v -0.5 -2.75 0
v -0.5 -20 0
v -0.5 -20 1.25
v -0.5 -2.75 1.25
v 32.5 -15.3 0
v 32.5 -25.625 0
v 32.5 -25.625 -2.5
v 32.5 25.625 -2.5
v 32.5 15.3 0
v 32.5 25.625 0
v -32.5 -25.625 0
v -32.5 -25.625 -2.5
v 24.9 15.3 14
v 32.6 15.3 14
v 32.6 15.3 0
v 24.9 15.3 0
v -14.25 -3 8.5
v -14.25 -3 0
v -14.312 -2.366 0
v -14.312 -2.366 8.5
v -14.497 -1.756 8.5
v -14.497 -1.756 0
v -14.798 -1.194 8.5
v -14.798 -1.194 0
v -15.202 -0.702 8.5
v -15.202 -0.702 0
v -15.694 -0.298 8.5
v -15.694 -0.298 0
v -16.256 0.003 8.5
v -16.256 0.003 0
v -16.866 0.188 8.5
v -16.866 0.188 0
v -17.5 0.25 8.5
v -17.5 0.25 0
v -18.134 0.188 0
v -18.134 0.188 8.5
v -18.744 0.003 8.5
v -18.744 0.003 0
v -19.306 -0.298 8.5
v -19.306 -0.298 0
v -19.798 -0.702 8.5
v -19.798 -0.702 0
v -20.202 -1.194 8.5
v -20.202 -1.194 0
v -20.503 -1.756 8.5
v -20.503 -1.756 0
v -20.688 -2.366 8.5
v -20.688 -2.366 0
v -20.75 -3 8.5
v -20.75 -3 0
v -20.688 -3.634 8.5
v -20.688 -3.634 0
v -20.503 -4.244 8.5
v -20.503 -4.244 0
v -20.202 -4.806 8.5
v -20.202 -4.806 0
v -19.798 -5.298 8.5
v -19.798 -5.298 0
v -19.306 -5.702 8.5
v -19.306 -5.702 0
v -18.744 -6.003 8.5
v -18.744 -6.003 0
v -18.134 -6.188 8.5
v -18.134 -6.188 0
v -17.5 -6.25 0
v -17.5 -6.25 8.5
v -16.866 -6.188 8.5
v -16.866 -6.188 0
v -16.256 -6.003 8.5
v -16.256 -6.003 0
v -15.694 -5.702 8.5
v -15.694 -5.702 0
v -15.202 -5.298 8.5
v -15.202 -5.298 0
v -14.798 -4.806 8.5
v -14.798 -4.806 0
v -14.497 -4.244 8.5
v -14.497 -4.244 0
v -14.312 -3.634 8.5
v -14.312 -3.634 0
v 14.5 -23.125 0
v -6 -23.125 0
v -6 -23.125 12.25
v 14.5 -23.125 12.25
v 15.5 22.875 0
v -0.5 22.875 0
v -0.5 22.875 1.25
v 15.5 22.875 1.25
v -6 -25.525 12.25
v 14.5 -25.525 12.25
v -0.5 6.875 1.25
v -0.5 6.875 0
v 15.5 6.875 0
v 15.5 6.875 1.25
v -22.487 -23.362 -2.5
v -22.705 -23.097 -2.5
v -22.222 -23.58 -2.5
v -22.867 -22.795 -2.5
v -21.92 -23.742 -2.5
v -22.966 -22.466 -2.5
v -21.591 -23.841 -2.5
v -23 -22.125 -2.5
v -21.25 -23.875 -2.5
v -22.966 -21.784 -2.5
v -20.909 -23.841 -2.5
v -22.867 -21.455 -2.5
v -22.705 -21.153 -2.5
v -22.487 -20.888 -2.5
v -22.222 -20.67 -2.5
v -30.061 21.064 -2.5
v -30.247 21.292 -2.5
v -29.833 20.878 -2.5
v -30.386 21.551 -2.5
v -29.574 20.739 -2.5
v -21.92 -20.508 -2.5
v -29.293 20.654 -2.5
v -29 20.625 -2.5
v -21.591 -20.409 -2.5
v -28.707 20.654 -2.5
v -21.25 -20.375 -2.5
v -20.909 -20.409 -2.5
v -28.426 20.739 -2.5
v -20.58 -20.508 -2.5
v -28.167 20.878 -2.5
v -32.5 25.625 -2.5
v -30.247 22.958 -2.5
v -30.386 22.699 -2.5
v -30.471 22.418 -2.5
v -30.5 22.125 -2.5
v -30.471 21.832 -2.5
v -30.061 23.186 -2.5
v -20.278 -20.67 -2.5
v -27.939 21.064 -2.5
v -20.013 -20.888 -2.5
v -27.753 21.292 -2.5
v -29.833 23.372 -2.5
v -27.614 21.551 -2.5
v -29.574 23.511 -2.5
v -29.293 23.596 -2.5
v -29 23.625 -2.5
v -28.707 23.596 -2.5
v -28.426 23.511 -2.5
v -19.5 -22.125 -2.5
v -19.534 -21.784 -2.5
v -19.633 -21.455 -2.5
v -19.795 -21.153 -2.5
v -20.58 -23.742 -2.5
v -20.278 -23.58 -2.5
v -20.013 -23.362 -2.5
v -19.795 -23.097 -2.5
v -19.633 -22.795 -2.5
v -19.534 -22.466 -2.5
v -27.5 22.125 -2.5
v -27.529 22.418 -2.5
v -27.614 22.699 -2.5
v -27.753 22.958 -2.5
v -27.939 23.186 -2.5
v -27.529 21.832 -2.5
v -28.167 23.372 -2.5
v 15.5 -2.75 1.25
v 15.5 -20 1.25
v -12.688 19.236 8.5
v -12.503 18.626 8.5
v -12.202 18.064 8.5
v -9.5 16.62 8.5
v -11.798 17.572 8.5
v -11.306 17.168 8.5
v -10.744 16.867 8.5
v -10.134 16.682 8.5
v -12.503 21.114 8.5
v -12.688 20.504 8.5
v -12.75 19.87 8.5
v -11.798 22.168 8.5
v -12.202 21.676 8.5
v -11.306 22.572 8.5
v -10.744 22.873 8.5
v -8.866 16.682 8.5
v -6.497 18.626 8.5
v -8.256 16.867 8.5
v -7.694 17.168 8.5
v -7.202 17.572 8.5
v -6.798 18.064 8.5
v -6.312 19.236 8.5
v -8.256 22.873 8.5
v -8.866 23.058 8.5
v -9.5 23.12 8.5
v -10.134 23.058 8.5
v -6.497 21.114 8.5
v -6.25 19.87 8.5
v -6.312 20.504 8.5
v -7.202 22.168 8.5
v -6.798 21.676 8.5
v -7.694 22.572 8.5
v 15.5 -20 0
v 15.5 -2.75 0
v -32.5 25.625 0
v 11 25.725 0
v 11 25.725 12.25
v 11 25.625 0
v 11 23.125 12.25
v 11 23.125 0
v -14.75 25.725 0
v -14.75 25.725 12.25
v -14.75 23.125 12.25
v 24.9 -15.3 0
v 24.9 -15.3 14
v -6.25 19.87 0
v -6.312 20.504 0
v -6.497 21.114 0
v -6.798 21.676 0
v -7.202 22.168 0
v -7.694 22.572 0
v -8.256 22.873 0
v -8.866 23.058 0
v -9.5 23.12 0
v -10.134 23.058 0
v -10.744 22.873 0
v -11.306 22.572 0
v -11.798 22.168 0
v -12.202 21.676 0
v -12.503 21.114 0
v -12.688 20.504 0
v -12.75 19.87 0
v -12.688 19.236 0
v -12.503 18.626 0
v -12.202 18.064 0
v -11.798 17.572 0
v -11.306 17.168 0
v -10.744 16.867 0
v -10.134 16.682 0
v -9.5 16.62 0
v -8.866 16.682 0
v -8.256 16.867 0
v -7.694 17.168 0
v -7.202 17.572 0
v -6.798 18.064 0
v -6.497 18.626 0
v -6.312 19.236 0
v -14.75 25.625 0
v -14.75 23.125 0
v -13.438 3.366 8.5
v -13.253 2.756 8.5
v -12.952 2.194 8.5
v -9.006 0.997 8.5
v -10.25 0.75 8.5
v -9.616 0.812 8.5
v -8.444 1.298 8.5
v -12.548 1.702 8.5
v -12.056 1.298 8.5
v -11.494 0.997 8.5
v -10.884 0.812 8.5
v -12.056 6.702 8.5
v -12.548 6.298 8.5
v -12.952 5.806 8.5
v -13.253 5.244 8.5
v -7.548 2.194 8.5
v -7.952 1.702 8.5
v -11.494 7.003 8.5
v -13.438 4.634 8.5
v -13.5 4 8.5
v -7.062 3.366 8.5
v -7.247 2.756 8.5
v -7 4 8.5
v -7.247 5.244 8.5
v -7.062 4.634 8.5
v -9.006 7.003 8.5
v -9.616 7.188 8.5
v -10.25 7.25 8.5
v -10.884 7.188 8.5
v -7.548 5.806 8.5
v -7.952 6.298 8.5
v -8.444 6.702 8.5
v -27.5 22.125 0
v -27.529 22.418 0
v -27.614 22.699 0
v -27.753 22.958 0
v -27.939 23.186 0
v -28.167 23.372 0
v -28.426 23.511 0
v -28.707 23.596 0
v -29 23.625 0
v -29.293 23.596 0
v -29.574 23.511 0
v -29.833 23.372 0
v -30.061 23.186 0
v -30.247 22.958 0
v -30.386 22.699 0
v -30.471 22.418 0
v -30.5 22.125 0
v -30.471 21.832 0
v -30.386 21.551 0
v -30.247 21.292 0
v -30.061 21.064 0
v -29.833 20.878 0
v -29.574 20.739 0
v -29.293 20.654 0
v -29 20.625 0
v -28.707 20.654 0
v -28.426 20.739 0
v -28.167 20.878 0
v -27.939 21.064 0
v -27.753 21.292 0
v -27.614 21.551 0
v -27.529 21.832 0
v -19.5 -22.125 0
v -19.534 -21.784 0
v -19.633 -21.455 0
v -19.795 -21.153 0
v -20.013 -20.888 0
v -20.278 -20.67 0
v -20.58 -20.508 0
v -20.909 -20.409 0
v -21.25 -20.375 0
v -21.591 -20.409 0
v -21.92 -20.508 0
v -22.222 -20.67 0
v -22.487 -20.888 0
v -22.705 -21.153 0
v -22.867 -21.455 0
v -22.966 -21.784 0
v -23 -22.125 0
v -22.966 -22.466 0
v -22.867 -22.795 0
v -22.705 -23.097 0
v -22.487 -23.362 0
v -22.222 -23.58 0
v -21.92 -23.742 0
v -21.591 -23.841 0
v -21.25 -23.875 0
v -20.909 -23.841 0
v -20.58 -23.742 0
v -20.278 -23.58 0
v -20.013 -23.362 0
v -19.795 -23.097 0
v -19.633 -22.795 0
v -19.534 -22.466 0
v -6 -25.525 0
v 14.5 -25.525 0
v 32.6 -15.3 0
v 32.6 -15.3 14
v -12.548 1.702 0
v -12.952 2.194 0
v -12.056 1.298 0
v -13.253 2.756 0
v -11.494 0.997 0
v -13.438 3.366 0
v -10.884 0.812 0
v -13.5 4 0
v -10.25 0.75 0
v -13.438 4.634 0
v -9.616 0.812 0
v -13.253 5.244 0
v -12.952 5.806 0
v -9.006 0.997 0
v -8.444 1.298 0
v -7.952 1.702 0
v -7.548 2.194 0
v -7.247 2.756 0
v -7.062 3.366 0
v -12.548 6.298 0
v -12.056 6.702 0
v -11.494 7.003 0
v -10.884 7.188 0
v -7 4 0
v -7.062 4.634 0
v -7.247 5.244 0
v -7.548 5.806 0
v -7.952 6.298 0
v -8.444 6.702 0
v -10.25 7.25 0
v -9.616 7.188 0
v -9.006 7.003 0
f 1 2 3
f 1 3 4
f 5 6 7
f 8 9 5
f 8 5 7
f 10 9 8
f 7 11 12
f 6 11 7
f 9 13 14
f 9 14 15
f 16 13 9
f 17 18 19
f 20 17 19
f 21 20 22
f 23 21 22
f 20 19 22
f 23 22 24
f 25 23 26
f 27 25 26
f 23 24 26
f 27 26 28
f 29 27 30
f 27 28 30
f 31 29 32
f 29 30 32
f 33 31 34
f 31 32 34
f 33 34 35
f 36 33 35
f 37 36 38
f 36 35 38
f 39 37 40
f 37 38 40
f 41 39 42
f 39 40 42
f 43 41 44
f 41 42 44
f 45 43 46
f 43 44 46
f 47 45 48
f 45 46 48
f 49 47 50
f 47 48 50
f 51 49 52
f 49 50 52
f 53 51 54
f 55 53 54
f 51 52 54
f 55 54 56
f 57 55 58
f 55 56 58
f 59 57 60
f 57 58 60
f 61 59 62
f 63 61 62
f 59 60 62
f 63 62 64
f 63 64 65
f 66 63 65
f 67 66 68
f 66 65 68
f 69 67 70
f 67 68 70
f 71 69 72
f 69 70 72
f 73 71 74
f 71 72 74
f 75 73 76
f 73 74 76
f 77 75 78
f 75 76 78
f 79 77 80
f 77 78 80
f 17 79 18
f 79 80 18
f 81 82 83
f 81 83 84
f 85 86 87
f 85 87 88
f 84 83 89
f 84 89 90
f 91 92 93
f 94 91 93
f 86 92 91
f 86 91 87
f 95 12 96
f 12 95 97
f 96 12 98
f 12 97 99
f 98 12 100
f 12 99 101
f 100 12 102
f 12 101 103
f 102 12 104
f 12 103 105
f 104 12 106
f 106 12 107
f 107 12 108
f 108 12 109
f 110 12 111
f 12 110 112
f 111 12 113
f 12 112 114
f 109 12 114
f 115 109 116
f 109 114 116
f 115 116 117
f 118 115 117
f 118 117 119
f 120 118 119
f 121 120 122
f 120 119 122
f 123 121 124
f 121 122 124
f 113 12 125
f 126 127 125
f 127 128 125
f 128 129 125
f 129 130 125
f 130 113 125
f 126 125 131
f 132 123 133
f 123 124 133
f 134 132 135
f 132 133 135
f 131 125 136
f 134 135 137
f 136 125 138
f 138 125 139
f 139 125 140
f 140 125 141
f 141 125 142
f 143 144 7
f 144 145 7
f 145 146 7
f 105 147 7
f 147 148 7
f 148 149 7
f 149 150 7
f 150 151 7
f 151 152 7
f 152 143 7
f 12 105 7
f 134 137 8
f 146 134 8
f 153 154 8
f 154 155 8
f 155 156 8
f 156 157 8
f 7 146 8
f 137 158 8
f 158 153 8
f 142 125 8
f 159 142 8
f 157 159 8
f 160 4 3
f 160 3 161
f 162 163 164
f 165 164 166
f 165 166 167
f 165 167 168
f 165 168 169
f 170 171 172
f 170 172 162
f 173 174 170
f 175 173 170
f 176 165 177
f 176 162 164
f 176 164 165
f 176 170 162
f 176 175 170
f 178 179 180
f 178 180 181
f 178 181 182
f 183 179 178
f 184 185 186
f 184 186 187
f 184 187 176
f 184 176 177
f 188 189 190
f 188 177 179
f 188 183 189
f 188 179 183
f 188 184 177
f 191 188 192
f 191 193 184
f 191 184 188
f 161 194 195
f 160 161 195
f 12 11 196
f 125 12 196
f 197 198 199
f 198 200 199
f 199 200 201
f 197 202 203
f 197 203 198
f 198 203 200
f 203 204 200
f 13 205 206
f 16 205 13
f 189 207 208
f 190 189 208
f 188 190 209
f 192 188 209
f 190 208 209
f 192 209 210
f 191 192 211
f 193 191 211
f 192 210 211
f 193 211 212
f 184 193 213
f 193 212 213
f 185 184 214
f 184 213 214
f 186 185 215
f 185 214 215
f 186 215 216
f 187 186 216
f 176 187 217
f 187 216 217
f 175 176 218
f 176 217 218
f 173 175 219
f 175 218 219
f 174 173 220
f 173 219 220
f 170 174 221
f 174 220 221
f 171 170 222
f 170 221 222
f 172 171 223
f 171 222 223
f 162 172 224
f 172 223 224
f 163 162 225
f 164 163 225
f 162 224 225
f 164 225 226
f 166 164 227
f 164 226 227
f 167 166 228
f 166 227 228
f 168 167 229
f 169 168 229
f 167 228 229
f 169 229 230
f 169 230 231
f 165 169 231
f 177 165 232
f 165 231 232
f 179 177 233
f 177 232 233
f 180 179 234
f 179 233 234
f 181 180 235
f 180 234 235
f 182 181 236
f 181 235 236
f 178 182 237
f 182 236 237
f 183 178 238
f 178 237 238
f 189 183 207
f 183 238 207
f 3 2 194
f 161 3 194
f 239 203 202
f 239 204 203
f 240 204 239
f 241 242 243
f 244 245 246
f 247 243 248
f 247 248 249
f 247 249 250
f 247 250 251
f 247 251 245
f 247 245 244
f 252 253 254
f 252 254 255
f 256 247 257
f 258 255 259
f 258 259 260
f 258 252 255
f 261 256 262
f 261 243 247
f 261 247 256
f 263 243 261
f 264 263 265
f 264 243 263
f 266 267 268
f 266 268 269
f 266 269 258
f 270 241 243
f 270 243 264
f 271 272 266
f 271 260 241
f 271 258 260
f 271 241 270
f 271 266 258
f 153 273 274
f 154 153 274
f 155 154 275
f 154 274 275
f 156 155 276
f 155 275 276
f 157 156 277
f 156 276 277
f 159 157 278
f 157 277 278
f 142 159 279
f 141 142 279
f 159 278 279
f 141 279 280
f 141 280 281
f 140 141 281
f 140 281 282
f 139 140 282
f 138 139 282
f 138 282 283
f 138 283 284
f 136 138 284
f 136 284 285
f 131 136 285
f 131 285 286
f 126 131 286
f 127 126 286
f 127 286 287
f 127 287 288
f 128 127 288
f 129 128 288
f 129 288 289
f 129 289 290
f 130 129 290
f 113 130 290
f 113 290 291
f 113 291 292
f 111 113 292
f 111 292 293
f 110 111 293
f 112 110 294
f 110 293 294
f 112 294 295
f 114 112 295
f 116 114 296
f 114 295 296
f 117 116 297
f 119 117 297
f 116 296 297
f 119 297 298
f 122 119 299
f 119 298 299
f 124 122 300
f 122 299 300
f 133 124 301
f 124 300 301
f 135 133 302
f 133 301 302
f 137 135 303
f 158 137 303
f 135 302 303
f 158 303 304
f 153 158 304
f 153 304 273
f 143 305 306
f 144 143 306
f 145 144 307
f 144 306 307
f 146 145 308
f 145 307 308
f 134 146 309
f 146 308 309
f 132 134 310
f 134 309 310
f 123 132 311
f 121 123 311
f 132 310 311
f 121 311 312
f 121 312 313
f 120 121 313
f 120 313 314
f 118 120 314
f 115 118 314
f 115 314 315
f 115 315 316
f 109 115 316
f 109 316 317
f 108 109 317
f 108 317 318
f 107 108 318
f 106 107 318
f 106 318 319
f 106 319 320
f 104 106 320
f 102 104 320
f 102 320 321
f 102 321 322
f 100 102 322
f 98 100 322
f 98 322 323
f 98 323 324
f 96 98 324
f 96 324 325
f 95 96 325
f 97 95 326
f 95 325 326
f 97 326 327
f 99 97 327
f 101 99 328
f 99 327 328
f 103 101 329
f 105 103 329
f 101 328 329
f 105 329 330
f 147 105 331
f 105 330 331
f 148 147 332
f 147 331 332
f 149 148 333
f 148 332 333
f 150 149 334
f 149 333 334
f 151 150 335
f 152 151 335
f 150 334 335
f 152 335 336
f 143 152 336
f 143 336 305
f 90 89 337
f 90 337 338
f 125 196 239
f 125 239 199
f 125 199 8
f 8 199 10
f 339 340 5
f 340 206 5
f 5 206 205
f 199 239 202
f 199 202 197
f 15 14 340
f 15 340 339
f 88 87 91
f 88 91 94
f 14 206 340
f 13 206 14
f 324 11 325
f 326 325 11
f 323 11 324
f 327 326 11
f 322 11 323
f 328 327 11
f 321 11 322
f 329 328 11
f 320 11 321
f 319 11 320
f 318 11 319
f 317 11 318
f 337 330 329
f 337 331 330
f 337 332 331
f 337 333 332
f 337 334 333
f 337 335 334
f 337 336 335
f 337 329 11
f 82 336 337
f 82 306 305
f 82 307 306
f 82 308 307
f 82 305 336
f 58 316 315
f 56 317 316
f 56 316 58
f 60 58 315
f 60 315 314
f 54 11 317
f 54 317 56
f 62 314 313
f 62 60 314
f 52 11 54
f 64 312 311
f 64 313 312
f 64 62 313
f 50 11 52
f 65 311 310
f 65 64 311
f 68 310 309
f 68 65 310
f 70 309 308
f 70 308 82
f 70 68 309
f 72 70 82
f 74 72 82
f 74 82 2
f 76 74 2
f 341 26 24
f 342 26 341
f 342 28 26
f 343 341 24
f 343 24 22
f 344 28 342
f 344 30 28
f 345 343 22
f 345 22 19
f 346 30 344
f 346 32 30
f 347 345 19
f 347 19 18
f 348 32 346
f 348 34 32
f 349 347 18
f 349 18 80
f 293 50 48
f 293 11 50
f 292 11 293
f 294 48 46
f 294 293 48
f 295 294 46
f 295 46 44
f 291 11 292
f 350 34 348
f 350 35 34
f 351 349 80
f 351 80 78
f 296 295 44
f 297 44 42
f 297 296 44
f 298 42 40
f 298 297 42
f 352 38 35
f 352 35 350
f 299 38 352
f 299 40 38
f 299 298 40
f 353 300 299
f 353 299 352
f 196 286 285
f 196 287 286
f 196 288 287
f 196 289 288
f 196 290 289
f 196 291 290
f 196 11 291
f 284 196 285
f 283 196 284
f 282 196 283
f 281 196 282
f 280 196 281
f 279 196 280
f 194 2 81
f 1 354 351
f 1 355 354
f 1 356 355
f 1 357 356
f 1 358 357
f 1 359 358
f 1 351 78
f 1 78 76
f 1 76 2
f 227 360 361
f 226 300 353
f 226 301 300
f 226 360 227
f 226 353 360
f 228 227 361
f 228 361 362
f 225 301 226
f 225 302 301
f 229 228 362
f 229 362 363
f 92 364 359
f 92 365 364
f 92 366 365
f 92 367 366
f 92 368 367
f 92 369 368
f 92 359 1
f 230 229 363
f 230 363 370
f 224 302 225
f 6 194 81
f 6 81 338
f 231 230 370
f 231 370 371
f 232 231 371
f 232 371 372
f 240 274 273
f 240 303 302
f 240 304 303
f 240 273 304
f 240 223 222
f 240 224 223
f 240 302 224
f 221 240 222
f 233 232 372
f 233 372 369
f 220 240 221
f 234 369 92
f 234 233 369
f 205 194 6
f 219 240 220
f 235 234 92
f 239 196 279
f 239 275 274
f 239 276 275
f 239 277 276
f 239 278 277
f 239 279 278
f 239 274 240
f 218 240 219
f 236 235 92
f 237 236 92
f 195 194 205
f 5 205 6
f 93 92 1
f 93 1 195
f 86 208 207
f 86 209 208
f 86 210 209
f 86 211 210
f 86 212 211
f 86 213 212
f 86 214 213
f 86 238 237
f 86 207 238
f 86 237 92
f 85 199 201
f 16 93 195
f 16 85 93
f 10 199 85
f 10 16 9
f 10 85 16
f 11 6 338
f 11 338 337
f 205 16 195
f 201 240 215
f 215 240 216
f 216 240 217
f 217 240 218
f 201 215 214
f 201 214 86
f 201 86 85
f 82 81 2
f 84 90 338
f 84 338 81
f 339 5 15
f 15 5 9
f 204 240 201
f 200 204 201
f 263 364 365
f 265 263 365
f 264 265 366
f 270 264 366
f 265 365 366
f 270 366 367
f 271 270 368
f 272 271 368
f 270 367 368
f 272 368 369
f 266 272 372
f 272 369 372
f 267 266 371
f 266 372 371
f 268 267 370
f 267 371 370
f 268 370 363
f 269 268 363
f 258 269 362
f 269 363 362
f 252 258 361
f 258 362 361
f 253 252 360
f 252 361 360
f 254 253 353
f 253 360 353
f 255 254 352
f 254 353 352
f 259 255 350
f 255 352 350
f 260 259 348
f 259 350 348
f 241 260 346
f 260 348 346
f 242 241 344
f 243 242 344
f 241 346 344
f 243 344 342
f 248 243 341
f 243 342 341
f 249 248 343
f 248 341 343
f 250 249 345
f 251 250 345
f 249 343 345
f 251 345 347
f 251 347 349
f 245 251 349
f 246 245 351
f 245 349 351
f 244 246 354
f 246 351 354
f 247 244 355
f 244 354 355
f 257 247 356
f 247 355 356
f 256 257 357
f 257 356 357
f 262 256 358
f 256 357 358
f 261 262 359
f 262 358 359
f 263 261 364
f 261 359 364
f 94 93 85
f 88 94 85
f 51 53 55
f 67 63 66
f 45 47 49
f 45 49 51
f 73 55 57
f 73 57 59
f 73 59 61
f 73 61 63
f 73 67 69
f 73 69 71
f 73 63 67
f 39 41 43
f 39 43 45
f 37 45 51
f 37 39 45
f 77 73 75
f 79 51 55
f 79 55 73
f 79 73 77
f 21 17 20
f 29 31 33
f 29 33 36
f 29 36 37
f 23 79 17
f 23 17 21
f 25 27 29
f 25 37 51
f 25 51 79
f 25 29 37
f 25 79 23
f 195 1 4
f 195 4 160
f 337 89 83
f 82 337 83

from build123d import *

# Parameters (mm, degrees)
SKETCH1_R            = 3.25
BOSS_EXTRUDE1_DEPTH  = 8.5
SKETCH3_W            = 65
SKETCH3_H            = 51.25
BOSS_EXTRUDE2_DEPTH  = 2.5
SKETCH4_W            = 7.6
SKETCH4_H            = 30.6
BOSS_EXTRUDE3_DEPTH  = 14
SKETCH5_R            = 3.25
BOSS_EXTRUDE4_DEPTH  = 8.5
SKETCH6_W            = 25.75
SKETCH6_H            = 2.5
BOSS_EXTRUDE5_DEPTH  = 12.25
SKETCH8_R            = 3.25
BOSS_EXTRUDE9_DEPTH  = 8.5
SKETCH9_W            = 20.5
SKETCH9_H            = 2.5
BOSS_EXTRUDE10_DEPTH = 12.25
SKETCH10_W           = 20.5
SKETCH10_H           = 12.25
CUT_EXTRUDE1_DEPTH   = 0.1
SKETCH12_W           = 25.75
SKETCH12_H           = 12.25
BOSS_EXTRUDE11_DEPTH = 0.1
SKETCH14_W           = 14
SKETCH14_H           = 30.6
BOSS_EXTRUDE12_DEPTH = 0.1
SKETCH15_R           = 1.5
CUT_EXTRUDE2_DEPTH   = 3.5
SKETCH16_R           = 1.75
CUT_EXTRUDE3_DEPTH   = 3.5
SKETCH17_W           = 16
SKETCH17_H           = 16
BOSS_EXTRUDE13_DEPTH = 1.25
SKETCH18_W           = 16
SKETCH18_H           = 17.25
BOSS_EXTRUDE14_DEPTH = 1.25


with BuildPart() as part:
    # Sketch1 → Boss-Extrude1 (new body)
    with BuildSketch(Plane.XY):
        with Locations((-17.5, -3)):
            Circle(SKETCH1_R)
    extrude(amount=BOSS_EXTRUDE1_DEPTH)

    # Sketch3 → Boss-Extrude2 (add)
    with BuildSketch(Plane.XY):
        Rectangle(SKETCH3_W, SKETCH3_H)
    extrude(amount=-BOSS_EXTRUDE2_DEPTH)

    # Sketch4 → Boss-Extrude3 (add)
    with BuildSketch(Plane.XY):
        with Locations((28.7, 0)):
            Rectangle(SKETCH4_W, SKETCH4_H)
    extrude(amount=BOSS_EXTRUDE3_DEPTH)

    # Sketch5 → Boss-Extrude4 (add)
    with BuildSketch(Plane.XY):
        with Locations((-10.25, 4)):
            Circle(SKETCH5_R)
    extrude(amount=BOSS_EXTRUDE4_DEPTH)

    # Sketch6 → Boss-Extrude5 (add)
    with BuildSketch(Plane.XY):
        with Locations((-1.875, 24.375)):
            Rectangle(SKETCH6_W, SKETCH6_H)
    extrude(amount=BOSS_EXTRUDE5_DEPTH)

    # Sketch8 → Boss-Extrude9 (add)
    with BuildSketch(Plane.XY):
        with Locations((-9.5, 19.87)):
            Circle(SKETCH8_R)
    extrude(amount=BOSS_EXTRUDE9_DEPTH)

    # Sketch9 → Boss-Extrude10 (add)
    with BuildSketch(Plane.XY):
        with Locations((4.25, -24.375)):
            Rectangle(SKETCH9_W, SKETCH9_H)
    extrude(amount=BOSS_EXTRUDE10_DEPTH)

    # Sketch10 → Cut-Extrude1 (cut)
    with BuildSketch(Plane.XZ.offset(25.625)):
        with Locations((4.25, 6.125)):
            Rectangle(SKETCH10_W, SKETCH10_H)
    extrude(amount=-CUT_EXTRUDE1_DEPTH, mode=Mode.SUBTRACT)

    # Sketch12 → Boss-Extrude11 (add)
    with BuildSketch(Plane(origin=(0, 25.625, 0), x_dir=(1, 0, 0), z_dir=(0, 1, 0))):
        with Locations((-1.875, -6.125)):
            Rectangle(SKETCH12_W, SKETCH12_H)
    extrude(amount=BOSS_EXTRUDE11_DEPTH)

    # Sketch14 → Boss-Extrude12 (add)
    with BuildSketch(Plane(origin=(32.5, 0, 0), x_dir=(0, 0, -1), z_dir=(1, 0, 0))):
        with Locations((-7, 0)):
            Rectangle(SKETCH14_W, SKETCH14_H)
    extrude(amount=BOSS_EXTRUDE12_DEPTH)

    # Sketch15 → Cut-Extrude2 (cut, through all)
    with BuildSketch(Plane.XY):
        with Locations((-29, 22.125)):
            Circle(SKETCH15_R)
    extrude(amount=-CUT_EXTRUDE2_DEPTH, mode=Mode.SUBTRACT)

    # Sketch16 → Cut-Extrude3 (cut, through all)
    with BuildSketch(Plane.XY):
        with Locations((-21.25, -22.125)):
            Circle(SKETCH16_R)
    extrude(amount=-CUT_EXTRUDE3_DEPTH, mode=Mode.SUBTRACT)

    # Sketch17 → Boss-Extrude13 (add)
    with BuildSketch(Plane.XY):
        with Locations((7.5, 14.875)):
            Rectangle(SKETCH17_W, SKETCH17_H)
    extrude(amount=BOSS_EXTRUDE13_DEPTH)

    # Sketch18 → Boss-Extrude14 (add)
    with BuildSketch(Plane.XY):
        with Locations((7.5, -11.375)):
            Rectangle(SKETCH18_W, SKETCH18_H)
    extrude(amount=BOSS_EXTRUDE14_DEPTH)


solid = part.part
